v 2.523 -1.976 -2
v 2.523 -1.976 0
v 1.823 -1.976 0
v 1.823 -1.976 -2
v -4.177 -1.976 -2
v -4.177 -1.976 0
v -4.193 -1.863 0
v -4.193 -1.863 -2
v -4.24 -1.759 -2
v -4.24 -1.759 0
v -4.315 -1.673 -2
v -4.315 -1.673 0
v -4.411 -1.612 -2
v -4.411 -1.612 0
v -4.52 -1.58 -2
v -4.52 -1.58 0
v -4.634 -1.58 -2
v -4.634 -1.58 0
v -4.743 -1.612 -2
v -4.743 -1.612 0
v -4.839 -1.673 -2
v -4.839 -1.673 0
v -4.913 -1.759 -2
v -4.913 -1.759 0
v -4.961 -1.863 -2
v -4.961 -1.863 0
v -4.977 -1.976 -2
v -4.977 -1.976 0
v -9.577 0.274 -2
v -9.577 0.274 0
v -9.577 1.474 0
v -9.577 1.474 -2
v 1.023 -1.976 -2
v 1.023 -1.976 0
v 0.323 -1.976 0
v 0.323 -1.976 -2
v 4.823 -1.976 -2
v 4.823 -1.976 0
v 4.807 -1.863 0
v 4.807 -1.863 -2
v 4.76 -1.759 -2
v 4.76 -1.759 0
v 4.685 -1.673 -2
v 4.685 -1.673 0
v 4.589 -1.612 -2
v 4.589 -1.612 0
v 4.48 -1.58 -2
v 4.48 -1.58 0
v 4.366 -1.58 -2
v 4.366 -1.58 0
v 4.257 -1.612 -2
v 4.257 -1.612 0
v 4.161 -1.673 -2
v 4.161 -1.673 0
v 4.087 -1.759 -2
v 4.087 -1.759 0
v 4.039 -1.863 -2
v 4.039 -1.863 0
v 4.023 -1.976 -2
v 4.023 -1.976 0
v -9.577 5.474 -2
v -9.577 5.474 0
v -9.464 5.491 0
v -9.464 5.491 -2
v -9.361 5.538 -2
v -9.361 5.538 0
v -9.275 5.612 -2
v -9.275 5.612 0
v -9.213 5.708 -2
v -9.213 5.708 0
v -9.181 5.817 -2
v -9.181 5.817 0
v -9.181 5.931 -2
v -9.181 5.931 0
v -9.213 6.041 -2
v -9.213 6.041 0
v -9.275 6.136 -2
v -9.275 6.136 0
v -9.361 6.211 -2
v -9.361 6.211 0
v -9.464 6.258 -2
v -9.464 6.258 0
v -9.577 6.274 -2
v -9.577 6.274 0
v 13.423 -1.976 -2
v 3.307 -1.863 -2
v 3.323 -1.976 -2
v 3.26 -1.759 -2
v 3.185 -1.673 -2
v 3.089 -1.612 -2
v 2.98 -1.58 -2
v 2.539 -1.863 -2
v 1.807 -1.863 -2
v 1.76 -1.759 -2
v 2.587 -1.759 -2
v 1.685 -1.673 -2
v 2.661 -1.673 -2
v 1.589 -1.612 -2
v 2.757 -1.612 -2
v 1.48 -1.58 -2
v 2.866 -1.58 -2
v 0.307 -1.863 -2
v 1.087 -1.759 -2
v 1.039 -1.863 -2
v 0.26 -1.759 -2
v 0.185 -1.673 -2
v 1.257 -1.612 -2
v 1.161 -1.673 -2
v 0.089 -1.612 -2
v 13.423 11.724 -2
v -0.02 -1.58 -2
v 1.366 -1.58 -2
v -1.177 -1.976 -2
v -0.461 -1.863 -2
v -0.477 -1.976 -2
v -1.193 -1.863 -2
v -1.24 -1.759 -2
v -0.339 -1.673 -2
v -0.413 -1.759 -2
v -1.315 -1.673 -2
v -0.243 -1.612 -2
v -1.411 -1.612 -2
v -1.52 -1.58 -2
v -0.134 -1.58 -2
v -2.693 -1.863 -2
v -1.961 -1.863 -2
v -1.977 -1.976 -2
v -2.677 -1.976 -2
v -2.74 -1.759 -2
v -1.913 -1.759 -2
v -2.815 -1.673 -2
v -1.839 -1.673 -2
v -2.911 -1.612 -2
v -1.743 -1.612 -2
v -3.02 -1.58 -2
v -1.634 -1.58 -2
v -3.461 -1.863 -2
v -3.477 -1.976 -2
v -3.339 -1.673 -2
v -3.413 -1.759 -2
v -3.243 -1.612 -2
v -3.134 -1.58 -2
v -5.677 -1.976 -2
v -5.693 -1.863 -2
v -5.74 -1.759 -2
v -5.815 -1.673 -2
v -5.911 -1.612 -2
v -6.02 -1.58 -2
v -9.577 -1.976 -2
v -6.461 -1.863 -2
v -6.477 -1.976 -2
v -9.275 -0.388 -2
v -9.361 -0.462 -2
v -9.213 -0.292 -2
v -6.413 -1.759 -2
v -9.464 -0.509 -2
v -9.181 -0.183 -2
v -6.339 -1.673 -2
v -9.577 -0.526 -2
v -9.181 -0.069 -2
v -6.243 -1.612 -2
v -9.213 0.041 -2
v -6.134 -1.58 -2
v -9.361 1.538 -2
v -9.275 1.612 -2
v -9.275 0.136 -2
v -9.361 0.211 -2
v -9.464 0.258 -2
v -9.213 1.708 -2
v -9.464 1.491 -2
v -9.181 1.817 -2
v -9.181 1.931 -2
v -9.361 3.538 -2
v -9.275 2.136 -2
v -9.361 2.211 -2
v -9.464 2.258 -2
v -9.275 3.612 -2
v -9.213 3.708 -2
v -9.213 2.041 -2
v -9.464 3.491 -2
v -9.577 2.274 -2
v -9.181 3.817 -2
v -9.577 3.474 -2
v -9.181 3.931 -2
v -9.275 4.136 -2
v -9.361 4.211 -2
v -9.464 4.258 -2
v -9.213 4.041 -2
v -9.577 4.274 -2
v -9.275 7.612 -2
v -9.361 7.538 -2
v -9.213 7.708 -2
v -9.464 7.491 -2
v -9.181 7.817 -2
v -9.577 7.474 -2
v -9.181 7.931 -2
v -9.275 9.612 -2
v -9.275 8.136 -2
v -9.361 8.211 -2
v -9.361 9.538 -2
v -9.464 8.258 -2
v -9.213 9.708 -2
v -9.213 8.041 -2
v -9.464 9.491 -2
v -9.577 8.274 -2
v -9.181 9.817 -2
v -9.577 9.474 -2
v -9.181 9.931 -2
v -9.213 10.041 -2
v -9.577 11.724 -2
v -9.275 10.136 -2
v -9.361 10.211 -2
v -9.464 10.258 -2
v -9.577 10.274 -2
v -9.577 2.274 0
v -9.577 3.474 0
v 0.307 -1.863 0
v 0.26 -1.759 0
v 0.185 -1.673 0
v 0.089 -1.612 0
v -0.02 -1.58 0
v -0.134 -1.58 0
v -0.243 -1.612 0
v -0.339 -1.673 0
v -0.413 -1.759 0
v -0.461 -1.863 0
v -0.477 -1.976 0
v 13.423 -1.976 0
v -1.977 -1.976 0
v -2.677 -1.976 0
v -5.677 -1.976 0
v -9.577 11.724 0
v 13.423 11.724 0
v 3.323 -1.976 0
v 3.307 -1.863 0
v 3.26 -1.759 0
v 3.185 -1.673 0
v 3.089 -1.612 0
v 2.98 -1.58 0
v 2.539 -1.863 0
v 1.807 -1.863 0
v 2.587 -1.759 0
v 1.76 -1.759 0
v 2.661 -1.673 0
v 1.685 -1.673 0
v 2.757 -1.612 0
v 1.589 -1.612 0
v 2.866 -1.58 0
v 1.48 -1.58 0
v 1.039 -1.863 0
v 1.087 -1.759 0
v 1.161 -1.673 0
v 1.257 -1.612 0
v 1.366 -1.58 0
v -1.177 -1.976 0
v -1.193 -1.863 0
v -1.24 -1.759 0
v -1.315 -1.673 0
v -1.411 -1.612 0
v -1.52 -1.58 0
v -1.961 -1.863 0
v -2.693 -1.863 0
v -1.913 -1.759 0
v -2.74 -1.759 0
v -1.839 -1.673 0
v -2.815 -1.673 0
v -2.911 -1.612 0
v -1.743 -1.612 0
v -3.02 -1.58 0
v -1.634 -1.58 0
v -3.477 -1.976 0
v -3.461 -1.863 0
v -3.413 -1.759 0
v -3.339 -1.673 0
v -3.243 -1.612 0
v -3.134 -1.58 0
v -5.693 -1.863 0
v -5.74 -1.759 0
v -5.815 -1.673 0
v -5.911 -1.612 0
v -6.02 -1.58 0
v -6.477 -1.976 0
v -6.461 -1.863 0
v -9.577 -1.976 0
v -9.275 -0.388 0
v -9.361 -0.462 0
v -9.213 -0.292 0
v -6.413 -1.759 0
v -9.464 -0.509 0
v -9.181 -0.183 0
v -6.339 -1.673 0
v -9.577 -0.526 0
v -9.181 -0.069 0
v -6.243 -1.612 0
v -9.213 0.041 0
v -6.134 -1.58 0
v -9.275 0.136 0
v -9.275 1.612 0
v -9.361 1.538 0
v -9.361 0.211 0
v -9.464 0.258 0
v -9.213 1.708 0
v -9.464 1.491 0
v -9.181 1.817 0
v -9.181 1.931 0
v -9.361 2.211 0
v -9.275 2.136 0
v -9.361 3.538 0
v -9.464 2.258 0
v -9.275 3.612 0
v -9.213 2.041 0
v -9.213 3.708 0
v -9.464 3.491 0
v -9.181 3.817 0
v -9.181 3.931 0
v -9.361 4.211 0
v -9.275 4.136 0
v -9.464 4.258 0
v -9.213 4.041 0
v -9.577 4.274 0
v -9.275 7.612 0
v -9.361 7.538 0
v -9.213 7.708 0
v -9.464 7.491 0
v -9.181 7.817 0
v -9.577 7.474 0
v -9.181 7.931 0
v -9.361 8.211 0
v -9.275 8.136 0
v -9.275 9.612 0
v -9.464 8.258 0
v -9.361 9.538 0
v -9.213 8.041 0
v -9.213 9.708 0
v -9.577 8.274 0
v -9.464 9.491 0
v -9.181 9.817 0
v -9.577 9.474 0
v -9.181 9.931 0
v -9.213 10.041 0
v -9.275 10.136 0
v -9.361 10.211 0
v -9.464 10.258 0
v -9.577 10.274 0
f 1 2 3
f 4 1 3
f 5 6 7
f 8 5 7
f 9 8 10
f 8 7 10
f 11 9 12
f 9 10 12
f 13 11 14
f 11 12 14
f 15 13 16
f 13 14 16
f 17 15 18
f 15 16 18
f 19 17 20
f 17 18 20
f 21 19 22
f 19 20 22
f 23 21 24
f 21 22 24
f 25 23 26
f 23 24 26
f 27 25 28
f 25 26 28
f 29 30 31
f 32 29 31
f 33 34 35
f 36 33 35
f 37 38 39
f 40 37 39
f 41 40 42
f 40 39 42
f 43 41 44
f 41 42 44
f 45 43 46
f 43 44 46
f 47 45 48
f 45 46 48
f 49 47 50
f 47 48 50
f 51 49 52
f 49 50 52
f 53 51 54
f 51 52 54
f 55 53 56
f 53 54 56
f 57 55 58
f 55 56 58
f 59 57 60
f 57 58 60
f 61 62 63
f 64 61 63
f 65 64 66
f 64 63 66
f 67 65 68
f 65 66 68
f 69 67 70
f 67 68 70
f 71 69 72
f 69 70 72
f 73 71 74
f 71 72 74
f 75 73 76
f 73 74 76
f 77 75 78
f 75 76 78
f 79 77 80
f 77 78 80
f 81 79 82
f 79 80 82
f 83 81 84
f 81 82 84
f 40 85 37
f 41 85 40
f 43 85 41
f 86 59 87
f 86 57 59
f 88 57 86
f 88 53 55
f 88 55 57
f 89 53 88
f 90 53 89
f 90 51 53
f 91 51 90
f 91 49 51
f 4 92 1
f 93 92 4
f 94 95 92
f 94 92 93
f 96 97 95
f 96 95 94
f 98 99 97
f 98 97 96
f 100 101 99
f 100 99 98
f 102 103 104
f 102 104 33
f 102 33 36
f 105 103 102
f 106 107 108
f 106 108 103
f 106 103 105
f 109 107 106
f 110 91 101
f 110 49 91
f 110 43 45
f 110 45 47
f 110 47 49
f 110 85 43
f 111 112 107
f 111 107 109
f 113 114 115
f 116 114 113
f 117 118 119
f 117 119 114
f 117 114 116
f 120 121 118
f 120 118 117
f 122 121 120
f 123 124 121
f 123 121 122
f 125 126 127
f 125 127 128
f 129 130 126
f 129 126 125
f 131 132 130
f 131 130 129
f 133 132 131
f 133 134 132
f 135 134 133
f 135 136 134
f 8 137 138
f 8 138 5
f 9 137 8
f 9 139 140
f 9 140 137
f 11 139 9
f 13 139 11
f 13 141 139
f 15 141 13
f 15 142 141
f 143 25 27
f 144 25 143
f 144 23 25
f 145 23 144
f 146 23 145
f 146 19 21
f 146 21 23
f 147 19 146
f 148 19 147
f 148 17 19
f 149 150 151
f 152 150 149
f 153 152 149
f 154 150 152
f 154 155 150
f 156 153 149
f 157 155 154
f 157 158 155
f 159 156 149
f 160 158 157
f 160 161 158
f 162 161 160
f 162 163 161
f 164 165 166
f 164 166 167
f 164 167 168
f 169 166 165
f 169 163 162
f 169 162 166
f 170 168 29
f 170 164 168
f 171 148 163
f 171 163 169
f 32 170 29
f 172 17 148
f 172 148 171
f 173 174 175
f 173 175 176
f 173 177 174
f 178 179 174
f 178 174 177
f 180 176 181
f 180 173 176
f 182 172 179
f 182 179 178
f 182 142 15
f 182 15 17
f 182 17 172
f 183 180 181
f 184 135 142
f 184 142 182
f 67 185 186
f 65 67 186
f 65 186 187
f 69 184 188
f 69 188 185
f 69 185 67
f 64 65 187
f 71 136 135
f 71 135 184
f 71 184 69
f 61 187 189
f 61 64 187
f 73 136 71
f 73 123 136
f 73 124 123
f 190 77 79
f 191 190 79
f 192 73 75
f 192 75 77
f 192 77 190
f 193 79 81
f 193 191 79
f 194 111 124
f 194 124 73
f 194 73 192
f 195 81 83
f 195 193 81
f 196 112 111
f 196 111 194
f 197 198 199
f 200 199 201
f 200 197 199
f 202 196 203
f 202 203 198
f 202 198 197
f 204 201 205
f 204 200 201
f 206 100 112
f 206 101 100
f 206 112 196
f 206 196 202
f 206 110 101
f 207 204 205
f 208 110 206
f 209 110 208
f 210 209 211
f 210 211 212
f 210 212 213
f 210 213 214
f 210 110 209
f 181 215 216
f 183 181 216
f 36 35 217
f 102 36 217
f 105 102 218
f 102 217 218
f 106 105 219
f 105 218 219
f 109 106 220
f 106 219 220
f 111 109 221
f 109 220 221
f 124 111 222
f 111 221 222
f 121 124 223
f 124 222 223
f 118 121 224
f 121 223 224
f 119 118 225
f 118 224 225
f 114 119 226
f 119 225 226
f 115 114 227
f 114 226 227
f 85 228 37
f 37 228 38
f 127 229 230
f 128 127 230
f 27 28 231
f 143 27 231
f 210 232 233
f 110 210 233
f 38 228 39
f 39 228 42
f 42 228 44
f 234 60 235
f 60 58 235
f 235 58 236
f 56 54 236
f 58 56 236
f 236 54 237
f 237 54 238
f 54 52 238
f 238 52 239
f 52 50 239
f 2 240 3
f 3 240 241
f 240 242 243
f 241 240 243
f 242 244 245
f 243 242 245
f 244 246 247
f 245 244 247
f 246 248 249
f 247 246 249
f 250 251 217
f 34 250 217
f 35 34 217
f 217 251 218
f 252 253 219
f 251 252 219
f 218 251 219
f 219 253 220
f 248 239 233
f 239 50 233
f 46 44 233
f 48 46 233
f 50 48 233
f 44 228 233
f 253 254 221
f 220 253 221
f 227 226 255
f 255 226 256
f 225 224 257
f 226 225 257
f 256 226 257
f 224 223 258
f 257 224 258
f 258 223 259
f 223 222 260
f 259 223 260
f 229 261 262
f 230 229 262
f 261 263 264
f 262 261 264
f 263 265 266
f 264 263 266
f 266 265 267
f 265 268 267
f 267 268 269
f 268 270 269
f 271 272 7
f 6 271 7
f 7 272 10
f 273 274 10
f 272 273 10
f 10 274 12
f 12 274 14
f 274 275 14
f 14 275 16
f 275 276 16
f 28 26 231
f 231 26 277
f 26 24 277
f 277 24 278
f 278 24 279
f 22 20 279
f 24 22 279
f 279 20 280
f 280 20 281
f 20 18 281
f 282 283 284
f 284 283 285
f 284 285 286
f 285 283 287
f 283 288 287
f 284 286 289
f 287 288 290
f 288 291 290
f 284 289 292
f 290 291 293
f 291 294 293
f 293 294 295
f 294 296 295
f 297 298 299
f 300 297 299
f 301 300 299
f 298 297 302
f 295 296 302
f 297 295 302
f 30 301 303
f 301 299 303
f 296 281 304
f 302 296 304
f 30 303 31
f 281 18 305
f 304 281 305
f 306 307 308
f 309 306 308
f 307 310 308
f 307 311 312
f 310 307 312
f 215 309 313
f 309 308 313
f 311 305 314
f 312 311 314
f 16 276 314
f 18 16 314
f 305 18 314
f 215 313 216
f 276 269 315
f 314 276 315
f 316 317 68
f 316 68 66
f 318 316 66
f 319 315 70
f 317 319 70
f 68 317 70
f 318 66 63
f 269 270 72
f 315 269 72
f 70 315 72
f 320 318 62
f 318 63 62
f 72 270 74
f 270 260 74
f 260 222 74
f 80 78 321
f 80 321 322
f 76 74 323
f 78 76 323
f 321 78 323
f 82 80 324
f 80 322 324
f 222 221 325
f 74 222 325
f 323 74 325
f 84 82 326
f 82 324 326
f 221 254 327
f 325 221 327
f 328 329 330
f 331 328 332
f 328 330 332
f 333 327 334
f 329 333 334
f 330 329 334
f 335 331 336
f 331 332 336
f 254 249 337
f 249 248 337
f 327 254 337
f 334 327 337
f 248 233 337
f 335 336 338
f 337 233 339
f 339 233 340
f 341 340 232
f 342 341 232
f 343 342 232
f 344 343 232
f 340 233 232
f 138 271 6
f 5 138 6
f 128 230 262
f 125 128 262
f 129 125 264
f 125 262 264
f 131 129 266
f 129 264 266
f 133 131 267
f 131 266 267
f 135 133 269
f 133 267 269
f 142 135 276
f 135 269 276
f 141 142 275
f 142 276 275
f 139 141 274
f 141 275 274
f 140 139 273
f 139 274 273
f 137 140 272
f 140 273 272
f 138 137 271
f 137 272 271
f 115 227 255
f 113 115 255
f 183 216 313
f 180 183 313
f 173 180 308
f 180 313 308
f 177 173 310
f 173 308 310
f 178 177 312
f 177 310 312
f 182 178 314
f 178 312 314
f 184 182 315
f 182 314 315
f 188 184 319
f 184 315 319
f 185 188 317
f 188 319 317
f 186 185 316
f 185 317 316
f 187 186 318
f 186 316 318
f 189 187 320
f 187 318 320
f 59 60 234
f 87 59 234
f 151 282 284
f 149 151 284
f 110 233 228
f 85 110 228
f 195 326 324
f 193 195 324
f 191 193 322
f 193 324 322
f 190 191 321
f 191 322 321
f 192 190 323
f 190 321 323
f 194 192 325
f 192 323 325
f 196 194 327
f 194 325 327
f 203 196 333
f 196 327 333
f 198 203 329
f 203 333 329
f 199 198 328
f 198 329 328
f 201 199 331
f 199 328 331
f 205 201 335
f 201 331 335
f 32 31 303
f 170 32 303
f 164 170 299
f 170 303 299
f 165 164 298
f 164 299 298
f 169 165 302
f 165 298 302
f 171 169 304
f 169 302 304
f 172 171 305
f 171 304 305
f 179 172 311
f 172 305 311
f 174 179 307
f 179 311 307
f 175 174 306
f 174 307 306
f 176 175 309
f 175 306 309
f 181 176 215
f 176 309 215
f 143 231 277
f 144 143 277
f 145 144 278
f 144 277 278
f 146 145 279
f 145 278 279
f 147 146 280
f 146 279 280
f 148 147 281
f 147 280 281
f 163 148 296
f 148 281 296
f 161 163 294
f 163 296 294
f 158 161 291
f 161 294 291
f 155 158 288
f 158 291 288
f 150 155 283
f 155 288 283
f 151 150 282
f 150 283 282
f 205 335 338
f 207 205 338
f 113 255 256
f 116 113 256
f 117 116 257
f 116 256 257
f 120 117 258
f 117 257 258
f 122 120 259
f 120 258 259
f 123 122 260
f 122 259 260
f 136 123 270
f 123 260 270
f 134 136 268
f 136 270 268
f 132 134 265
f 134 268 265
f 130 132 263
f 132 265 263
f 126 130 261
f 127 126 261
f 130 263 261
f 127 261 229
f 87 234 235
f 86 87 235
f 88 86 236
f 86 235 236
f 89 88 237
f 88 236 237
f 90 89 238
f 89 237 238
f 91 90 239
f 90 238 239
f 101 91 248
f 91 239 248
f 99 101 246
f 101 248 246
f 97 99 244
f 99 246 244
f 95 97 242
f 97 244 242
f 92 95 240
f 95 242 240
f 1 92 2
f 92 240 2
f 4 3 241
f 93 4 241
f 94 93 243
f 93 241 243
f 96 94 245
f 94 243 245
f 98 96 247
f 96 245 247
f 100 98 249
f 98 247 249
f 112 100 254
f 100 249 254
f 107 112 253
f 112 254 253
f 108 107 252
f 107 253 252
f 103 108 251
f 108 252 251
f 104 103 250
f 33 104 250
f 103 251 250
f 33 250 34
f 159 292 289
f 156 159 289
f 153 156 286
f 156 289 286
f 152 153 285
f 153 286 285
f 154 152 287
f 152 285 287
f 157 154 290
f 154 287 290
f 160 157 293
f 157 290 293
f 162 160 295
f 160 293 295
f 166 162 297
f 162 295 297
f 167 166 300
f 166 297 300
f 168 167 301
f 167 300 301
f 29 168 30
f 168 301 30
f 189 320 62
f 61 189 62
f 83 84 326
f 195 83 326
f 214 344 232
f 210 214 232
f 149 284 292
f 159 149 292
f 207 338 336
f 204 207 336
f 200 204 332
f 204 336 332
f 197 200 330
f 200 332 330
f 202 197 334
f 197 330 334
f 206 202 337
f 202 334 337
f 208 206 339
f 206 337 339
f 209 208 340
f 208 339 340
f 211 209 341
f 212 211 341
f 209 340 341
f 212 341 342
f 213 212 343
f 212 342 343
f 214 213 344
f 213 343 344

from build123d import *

# Parameters (mm, degrees)
EXTRUDE_1_DEPTH = 2


with BuildPart() as part:
    # Эскиз1 → Бобышка-Вытянуть1 (new body)
    with BuildSketch(Plane(origin=(0, 0, 0), x_dir=(-1, 0, 0), z_dir=(0, 0, -1))):
        with BuildLine():
            Line((-4.023063957, -1.975599526), (-3.323063957, -1.975599526))
            ThreePointArc((-3.323063957, -1.975599526), (-2.923063957, -1.575599526), (-2.523063957, -1.975599526))
            Line((-2.523063957, -1.975599526), (-1.823063957, -1.975599526))
            ThreePointArc((-1.823063957, -1.975599526), (-1.423063957, -1.575599526), (-1.023063957, -1.975599526))
            Line((-1.023063957, -1.975599526), (-0.323063957, -1.975599526))
            ThreePointArc((-0.323063957, -1.975599526), (0.076936043, -1.575599526), (0.476936043, -1.975599526))
            Line((0.476936043, -1.975599526), (1.176936043, -1.975599526))
            ThreePointArc((1.176936043, -1.975599526), (1.576936043, -1.575599526), (1.976936043, -1.975599526))
            Line((1.976936043, -1.975599526), (2.676936043, -1.975599526))
            ThreePointArc((2.676936043, -1.975599526), (3.076936043, -1.575599526), (3.476936043, -1.975599526))
            Line((3.476936043, -1.975599526), (4.176936043, -1.975599526))
            ThreePointArc((4.176936043, -1.975599526), (4.576936043, -1.575599526), (4.976936043, -1.975599526))
            Line((4.976936043, -1.975599526), (5.676936043, -1.975599526))
            ThreePointArc((5.676936043, -1.975599526), (6.076936043, -1.575599526), (6.476936043, -1.975599526))
            Line((6.476936043, -1.975599526), (9.576936043, -1.975599526))
            Line((9.576936043, -1.975599526), (9.576936043, -0.525599526))
            ThreePointArc((9.576936043, -0.525599526), (9.176936043, -0.125599526), (9.576936043, 0.274400474))
            Line((9.576936043, 0.274400474), (9.576936043, 1.474400474))
            ThreePointArc((9.576936043, 1.474400474), (9.176936043, 1.874400474), (9.576936043, 2.274400474))
            Line((9.576936043, 2.274400474), (9.576936043, 3.474400474))
            ThreePointArc((9.576936043, 3.474400474), (9.176936043, 3.874400474), (9.576936043, 4.274400474))
            Line((9.576936043, 4.274400474), (9.576936043, 5.474400474))
            ThreePointArc((9.576936043, 5.474400474), (9.176936043, 5.874400474), (9.576936043, 6.274400474))
            Line((9.576936043, 6.274400474), (9.576936043, 7.474400474))
            ThreePointArc((9.576936043, 7.474400474), (9.176936043, 7.874400474), (9.576936043, 8.274400474))
            Line((9.576936043, 8.274400474), (9.576936043, 9.474400474))
            ThreePointArc((9.576936043, 9.474400474), (9.176936043, 9.874400474), (9.576936043, 10.274400474))
            Line((9.576936043, 10.274400474), (9.576936043, 11.724400474))
            Line((9.576936043, 11.724400474), (-13.423063957, 11.724400474))
            Line((-13.423063957, 11.724400474), (-13.423063957, -1.975599526))
            Line((-13.423063957, -1.975599526), (-4.823063957, -1.975599526))
            ThreePointArc((-4.823063957, -1.975599526), (-4.423063957, -1.575599526), (-4.023063957, -1.975599526))
        make_face()
    extrude(amount=EXTRUDE_1_DEPTH)


solid = part.part
